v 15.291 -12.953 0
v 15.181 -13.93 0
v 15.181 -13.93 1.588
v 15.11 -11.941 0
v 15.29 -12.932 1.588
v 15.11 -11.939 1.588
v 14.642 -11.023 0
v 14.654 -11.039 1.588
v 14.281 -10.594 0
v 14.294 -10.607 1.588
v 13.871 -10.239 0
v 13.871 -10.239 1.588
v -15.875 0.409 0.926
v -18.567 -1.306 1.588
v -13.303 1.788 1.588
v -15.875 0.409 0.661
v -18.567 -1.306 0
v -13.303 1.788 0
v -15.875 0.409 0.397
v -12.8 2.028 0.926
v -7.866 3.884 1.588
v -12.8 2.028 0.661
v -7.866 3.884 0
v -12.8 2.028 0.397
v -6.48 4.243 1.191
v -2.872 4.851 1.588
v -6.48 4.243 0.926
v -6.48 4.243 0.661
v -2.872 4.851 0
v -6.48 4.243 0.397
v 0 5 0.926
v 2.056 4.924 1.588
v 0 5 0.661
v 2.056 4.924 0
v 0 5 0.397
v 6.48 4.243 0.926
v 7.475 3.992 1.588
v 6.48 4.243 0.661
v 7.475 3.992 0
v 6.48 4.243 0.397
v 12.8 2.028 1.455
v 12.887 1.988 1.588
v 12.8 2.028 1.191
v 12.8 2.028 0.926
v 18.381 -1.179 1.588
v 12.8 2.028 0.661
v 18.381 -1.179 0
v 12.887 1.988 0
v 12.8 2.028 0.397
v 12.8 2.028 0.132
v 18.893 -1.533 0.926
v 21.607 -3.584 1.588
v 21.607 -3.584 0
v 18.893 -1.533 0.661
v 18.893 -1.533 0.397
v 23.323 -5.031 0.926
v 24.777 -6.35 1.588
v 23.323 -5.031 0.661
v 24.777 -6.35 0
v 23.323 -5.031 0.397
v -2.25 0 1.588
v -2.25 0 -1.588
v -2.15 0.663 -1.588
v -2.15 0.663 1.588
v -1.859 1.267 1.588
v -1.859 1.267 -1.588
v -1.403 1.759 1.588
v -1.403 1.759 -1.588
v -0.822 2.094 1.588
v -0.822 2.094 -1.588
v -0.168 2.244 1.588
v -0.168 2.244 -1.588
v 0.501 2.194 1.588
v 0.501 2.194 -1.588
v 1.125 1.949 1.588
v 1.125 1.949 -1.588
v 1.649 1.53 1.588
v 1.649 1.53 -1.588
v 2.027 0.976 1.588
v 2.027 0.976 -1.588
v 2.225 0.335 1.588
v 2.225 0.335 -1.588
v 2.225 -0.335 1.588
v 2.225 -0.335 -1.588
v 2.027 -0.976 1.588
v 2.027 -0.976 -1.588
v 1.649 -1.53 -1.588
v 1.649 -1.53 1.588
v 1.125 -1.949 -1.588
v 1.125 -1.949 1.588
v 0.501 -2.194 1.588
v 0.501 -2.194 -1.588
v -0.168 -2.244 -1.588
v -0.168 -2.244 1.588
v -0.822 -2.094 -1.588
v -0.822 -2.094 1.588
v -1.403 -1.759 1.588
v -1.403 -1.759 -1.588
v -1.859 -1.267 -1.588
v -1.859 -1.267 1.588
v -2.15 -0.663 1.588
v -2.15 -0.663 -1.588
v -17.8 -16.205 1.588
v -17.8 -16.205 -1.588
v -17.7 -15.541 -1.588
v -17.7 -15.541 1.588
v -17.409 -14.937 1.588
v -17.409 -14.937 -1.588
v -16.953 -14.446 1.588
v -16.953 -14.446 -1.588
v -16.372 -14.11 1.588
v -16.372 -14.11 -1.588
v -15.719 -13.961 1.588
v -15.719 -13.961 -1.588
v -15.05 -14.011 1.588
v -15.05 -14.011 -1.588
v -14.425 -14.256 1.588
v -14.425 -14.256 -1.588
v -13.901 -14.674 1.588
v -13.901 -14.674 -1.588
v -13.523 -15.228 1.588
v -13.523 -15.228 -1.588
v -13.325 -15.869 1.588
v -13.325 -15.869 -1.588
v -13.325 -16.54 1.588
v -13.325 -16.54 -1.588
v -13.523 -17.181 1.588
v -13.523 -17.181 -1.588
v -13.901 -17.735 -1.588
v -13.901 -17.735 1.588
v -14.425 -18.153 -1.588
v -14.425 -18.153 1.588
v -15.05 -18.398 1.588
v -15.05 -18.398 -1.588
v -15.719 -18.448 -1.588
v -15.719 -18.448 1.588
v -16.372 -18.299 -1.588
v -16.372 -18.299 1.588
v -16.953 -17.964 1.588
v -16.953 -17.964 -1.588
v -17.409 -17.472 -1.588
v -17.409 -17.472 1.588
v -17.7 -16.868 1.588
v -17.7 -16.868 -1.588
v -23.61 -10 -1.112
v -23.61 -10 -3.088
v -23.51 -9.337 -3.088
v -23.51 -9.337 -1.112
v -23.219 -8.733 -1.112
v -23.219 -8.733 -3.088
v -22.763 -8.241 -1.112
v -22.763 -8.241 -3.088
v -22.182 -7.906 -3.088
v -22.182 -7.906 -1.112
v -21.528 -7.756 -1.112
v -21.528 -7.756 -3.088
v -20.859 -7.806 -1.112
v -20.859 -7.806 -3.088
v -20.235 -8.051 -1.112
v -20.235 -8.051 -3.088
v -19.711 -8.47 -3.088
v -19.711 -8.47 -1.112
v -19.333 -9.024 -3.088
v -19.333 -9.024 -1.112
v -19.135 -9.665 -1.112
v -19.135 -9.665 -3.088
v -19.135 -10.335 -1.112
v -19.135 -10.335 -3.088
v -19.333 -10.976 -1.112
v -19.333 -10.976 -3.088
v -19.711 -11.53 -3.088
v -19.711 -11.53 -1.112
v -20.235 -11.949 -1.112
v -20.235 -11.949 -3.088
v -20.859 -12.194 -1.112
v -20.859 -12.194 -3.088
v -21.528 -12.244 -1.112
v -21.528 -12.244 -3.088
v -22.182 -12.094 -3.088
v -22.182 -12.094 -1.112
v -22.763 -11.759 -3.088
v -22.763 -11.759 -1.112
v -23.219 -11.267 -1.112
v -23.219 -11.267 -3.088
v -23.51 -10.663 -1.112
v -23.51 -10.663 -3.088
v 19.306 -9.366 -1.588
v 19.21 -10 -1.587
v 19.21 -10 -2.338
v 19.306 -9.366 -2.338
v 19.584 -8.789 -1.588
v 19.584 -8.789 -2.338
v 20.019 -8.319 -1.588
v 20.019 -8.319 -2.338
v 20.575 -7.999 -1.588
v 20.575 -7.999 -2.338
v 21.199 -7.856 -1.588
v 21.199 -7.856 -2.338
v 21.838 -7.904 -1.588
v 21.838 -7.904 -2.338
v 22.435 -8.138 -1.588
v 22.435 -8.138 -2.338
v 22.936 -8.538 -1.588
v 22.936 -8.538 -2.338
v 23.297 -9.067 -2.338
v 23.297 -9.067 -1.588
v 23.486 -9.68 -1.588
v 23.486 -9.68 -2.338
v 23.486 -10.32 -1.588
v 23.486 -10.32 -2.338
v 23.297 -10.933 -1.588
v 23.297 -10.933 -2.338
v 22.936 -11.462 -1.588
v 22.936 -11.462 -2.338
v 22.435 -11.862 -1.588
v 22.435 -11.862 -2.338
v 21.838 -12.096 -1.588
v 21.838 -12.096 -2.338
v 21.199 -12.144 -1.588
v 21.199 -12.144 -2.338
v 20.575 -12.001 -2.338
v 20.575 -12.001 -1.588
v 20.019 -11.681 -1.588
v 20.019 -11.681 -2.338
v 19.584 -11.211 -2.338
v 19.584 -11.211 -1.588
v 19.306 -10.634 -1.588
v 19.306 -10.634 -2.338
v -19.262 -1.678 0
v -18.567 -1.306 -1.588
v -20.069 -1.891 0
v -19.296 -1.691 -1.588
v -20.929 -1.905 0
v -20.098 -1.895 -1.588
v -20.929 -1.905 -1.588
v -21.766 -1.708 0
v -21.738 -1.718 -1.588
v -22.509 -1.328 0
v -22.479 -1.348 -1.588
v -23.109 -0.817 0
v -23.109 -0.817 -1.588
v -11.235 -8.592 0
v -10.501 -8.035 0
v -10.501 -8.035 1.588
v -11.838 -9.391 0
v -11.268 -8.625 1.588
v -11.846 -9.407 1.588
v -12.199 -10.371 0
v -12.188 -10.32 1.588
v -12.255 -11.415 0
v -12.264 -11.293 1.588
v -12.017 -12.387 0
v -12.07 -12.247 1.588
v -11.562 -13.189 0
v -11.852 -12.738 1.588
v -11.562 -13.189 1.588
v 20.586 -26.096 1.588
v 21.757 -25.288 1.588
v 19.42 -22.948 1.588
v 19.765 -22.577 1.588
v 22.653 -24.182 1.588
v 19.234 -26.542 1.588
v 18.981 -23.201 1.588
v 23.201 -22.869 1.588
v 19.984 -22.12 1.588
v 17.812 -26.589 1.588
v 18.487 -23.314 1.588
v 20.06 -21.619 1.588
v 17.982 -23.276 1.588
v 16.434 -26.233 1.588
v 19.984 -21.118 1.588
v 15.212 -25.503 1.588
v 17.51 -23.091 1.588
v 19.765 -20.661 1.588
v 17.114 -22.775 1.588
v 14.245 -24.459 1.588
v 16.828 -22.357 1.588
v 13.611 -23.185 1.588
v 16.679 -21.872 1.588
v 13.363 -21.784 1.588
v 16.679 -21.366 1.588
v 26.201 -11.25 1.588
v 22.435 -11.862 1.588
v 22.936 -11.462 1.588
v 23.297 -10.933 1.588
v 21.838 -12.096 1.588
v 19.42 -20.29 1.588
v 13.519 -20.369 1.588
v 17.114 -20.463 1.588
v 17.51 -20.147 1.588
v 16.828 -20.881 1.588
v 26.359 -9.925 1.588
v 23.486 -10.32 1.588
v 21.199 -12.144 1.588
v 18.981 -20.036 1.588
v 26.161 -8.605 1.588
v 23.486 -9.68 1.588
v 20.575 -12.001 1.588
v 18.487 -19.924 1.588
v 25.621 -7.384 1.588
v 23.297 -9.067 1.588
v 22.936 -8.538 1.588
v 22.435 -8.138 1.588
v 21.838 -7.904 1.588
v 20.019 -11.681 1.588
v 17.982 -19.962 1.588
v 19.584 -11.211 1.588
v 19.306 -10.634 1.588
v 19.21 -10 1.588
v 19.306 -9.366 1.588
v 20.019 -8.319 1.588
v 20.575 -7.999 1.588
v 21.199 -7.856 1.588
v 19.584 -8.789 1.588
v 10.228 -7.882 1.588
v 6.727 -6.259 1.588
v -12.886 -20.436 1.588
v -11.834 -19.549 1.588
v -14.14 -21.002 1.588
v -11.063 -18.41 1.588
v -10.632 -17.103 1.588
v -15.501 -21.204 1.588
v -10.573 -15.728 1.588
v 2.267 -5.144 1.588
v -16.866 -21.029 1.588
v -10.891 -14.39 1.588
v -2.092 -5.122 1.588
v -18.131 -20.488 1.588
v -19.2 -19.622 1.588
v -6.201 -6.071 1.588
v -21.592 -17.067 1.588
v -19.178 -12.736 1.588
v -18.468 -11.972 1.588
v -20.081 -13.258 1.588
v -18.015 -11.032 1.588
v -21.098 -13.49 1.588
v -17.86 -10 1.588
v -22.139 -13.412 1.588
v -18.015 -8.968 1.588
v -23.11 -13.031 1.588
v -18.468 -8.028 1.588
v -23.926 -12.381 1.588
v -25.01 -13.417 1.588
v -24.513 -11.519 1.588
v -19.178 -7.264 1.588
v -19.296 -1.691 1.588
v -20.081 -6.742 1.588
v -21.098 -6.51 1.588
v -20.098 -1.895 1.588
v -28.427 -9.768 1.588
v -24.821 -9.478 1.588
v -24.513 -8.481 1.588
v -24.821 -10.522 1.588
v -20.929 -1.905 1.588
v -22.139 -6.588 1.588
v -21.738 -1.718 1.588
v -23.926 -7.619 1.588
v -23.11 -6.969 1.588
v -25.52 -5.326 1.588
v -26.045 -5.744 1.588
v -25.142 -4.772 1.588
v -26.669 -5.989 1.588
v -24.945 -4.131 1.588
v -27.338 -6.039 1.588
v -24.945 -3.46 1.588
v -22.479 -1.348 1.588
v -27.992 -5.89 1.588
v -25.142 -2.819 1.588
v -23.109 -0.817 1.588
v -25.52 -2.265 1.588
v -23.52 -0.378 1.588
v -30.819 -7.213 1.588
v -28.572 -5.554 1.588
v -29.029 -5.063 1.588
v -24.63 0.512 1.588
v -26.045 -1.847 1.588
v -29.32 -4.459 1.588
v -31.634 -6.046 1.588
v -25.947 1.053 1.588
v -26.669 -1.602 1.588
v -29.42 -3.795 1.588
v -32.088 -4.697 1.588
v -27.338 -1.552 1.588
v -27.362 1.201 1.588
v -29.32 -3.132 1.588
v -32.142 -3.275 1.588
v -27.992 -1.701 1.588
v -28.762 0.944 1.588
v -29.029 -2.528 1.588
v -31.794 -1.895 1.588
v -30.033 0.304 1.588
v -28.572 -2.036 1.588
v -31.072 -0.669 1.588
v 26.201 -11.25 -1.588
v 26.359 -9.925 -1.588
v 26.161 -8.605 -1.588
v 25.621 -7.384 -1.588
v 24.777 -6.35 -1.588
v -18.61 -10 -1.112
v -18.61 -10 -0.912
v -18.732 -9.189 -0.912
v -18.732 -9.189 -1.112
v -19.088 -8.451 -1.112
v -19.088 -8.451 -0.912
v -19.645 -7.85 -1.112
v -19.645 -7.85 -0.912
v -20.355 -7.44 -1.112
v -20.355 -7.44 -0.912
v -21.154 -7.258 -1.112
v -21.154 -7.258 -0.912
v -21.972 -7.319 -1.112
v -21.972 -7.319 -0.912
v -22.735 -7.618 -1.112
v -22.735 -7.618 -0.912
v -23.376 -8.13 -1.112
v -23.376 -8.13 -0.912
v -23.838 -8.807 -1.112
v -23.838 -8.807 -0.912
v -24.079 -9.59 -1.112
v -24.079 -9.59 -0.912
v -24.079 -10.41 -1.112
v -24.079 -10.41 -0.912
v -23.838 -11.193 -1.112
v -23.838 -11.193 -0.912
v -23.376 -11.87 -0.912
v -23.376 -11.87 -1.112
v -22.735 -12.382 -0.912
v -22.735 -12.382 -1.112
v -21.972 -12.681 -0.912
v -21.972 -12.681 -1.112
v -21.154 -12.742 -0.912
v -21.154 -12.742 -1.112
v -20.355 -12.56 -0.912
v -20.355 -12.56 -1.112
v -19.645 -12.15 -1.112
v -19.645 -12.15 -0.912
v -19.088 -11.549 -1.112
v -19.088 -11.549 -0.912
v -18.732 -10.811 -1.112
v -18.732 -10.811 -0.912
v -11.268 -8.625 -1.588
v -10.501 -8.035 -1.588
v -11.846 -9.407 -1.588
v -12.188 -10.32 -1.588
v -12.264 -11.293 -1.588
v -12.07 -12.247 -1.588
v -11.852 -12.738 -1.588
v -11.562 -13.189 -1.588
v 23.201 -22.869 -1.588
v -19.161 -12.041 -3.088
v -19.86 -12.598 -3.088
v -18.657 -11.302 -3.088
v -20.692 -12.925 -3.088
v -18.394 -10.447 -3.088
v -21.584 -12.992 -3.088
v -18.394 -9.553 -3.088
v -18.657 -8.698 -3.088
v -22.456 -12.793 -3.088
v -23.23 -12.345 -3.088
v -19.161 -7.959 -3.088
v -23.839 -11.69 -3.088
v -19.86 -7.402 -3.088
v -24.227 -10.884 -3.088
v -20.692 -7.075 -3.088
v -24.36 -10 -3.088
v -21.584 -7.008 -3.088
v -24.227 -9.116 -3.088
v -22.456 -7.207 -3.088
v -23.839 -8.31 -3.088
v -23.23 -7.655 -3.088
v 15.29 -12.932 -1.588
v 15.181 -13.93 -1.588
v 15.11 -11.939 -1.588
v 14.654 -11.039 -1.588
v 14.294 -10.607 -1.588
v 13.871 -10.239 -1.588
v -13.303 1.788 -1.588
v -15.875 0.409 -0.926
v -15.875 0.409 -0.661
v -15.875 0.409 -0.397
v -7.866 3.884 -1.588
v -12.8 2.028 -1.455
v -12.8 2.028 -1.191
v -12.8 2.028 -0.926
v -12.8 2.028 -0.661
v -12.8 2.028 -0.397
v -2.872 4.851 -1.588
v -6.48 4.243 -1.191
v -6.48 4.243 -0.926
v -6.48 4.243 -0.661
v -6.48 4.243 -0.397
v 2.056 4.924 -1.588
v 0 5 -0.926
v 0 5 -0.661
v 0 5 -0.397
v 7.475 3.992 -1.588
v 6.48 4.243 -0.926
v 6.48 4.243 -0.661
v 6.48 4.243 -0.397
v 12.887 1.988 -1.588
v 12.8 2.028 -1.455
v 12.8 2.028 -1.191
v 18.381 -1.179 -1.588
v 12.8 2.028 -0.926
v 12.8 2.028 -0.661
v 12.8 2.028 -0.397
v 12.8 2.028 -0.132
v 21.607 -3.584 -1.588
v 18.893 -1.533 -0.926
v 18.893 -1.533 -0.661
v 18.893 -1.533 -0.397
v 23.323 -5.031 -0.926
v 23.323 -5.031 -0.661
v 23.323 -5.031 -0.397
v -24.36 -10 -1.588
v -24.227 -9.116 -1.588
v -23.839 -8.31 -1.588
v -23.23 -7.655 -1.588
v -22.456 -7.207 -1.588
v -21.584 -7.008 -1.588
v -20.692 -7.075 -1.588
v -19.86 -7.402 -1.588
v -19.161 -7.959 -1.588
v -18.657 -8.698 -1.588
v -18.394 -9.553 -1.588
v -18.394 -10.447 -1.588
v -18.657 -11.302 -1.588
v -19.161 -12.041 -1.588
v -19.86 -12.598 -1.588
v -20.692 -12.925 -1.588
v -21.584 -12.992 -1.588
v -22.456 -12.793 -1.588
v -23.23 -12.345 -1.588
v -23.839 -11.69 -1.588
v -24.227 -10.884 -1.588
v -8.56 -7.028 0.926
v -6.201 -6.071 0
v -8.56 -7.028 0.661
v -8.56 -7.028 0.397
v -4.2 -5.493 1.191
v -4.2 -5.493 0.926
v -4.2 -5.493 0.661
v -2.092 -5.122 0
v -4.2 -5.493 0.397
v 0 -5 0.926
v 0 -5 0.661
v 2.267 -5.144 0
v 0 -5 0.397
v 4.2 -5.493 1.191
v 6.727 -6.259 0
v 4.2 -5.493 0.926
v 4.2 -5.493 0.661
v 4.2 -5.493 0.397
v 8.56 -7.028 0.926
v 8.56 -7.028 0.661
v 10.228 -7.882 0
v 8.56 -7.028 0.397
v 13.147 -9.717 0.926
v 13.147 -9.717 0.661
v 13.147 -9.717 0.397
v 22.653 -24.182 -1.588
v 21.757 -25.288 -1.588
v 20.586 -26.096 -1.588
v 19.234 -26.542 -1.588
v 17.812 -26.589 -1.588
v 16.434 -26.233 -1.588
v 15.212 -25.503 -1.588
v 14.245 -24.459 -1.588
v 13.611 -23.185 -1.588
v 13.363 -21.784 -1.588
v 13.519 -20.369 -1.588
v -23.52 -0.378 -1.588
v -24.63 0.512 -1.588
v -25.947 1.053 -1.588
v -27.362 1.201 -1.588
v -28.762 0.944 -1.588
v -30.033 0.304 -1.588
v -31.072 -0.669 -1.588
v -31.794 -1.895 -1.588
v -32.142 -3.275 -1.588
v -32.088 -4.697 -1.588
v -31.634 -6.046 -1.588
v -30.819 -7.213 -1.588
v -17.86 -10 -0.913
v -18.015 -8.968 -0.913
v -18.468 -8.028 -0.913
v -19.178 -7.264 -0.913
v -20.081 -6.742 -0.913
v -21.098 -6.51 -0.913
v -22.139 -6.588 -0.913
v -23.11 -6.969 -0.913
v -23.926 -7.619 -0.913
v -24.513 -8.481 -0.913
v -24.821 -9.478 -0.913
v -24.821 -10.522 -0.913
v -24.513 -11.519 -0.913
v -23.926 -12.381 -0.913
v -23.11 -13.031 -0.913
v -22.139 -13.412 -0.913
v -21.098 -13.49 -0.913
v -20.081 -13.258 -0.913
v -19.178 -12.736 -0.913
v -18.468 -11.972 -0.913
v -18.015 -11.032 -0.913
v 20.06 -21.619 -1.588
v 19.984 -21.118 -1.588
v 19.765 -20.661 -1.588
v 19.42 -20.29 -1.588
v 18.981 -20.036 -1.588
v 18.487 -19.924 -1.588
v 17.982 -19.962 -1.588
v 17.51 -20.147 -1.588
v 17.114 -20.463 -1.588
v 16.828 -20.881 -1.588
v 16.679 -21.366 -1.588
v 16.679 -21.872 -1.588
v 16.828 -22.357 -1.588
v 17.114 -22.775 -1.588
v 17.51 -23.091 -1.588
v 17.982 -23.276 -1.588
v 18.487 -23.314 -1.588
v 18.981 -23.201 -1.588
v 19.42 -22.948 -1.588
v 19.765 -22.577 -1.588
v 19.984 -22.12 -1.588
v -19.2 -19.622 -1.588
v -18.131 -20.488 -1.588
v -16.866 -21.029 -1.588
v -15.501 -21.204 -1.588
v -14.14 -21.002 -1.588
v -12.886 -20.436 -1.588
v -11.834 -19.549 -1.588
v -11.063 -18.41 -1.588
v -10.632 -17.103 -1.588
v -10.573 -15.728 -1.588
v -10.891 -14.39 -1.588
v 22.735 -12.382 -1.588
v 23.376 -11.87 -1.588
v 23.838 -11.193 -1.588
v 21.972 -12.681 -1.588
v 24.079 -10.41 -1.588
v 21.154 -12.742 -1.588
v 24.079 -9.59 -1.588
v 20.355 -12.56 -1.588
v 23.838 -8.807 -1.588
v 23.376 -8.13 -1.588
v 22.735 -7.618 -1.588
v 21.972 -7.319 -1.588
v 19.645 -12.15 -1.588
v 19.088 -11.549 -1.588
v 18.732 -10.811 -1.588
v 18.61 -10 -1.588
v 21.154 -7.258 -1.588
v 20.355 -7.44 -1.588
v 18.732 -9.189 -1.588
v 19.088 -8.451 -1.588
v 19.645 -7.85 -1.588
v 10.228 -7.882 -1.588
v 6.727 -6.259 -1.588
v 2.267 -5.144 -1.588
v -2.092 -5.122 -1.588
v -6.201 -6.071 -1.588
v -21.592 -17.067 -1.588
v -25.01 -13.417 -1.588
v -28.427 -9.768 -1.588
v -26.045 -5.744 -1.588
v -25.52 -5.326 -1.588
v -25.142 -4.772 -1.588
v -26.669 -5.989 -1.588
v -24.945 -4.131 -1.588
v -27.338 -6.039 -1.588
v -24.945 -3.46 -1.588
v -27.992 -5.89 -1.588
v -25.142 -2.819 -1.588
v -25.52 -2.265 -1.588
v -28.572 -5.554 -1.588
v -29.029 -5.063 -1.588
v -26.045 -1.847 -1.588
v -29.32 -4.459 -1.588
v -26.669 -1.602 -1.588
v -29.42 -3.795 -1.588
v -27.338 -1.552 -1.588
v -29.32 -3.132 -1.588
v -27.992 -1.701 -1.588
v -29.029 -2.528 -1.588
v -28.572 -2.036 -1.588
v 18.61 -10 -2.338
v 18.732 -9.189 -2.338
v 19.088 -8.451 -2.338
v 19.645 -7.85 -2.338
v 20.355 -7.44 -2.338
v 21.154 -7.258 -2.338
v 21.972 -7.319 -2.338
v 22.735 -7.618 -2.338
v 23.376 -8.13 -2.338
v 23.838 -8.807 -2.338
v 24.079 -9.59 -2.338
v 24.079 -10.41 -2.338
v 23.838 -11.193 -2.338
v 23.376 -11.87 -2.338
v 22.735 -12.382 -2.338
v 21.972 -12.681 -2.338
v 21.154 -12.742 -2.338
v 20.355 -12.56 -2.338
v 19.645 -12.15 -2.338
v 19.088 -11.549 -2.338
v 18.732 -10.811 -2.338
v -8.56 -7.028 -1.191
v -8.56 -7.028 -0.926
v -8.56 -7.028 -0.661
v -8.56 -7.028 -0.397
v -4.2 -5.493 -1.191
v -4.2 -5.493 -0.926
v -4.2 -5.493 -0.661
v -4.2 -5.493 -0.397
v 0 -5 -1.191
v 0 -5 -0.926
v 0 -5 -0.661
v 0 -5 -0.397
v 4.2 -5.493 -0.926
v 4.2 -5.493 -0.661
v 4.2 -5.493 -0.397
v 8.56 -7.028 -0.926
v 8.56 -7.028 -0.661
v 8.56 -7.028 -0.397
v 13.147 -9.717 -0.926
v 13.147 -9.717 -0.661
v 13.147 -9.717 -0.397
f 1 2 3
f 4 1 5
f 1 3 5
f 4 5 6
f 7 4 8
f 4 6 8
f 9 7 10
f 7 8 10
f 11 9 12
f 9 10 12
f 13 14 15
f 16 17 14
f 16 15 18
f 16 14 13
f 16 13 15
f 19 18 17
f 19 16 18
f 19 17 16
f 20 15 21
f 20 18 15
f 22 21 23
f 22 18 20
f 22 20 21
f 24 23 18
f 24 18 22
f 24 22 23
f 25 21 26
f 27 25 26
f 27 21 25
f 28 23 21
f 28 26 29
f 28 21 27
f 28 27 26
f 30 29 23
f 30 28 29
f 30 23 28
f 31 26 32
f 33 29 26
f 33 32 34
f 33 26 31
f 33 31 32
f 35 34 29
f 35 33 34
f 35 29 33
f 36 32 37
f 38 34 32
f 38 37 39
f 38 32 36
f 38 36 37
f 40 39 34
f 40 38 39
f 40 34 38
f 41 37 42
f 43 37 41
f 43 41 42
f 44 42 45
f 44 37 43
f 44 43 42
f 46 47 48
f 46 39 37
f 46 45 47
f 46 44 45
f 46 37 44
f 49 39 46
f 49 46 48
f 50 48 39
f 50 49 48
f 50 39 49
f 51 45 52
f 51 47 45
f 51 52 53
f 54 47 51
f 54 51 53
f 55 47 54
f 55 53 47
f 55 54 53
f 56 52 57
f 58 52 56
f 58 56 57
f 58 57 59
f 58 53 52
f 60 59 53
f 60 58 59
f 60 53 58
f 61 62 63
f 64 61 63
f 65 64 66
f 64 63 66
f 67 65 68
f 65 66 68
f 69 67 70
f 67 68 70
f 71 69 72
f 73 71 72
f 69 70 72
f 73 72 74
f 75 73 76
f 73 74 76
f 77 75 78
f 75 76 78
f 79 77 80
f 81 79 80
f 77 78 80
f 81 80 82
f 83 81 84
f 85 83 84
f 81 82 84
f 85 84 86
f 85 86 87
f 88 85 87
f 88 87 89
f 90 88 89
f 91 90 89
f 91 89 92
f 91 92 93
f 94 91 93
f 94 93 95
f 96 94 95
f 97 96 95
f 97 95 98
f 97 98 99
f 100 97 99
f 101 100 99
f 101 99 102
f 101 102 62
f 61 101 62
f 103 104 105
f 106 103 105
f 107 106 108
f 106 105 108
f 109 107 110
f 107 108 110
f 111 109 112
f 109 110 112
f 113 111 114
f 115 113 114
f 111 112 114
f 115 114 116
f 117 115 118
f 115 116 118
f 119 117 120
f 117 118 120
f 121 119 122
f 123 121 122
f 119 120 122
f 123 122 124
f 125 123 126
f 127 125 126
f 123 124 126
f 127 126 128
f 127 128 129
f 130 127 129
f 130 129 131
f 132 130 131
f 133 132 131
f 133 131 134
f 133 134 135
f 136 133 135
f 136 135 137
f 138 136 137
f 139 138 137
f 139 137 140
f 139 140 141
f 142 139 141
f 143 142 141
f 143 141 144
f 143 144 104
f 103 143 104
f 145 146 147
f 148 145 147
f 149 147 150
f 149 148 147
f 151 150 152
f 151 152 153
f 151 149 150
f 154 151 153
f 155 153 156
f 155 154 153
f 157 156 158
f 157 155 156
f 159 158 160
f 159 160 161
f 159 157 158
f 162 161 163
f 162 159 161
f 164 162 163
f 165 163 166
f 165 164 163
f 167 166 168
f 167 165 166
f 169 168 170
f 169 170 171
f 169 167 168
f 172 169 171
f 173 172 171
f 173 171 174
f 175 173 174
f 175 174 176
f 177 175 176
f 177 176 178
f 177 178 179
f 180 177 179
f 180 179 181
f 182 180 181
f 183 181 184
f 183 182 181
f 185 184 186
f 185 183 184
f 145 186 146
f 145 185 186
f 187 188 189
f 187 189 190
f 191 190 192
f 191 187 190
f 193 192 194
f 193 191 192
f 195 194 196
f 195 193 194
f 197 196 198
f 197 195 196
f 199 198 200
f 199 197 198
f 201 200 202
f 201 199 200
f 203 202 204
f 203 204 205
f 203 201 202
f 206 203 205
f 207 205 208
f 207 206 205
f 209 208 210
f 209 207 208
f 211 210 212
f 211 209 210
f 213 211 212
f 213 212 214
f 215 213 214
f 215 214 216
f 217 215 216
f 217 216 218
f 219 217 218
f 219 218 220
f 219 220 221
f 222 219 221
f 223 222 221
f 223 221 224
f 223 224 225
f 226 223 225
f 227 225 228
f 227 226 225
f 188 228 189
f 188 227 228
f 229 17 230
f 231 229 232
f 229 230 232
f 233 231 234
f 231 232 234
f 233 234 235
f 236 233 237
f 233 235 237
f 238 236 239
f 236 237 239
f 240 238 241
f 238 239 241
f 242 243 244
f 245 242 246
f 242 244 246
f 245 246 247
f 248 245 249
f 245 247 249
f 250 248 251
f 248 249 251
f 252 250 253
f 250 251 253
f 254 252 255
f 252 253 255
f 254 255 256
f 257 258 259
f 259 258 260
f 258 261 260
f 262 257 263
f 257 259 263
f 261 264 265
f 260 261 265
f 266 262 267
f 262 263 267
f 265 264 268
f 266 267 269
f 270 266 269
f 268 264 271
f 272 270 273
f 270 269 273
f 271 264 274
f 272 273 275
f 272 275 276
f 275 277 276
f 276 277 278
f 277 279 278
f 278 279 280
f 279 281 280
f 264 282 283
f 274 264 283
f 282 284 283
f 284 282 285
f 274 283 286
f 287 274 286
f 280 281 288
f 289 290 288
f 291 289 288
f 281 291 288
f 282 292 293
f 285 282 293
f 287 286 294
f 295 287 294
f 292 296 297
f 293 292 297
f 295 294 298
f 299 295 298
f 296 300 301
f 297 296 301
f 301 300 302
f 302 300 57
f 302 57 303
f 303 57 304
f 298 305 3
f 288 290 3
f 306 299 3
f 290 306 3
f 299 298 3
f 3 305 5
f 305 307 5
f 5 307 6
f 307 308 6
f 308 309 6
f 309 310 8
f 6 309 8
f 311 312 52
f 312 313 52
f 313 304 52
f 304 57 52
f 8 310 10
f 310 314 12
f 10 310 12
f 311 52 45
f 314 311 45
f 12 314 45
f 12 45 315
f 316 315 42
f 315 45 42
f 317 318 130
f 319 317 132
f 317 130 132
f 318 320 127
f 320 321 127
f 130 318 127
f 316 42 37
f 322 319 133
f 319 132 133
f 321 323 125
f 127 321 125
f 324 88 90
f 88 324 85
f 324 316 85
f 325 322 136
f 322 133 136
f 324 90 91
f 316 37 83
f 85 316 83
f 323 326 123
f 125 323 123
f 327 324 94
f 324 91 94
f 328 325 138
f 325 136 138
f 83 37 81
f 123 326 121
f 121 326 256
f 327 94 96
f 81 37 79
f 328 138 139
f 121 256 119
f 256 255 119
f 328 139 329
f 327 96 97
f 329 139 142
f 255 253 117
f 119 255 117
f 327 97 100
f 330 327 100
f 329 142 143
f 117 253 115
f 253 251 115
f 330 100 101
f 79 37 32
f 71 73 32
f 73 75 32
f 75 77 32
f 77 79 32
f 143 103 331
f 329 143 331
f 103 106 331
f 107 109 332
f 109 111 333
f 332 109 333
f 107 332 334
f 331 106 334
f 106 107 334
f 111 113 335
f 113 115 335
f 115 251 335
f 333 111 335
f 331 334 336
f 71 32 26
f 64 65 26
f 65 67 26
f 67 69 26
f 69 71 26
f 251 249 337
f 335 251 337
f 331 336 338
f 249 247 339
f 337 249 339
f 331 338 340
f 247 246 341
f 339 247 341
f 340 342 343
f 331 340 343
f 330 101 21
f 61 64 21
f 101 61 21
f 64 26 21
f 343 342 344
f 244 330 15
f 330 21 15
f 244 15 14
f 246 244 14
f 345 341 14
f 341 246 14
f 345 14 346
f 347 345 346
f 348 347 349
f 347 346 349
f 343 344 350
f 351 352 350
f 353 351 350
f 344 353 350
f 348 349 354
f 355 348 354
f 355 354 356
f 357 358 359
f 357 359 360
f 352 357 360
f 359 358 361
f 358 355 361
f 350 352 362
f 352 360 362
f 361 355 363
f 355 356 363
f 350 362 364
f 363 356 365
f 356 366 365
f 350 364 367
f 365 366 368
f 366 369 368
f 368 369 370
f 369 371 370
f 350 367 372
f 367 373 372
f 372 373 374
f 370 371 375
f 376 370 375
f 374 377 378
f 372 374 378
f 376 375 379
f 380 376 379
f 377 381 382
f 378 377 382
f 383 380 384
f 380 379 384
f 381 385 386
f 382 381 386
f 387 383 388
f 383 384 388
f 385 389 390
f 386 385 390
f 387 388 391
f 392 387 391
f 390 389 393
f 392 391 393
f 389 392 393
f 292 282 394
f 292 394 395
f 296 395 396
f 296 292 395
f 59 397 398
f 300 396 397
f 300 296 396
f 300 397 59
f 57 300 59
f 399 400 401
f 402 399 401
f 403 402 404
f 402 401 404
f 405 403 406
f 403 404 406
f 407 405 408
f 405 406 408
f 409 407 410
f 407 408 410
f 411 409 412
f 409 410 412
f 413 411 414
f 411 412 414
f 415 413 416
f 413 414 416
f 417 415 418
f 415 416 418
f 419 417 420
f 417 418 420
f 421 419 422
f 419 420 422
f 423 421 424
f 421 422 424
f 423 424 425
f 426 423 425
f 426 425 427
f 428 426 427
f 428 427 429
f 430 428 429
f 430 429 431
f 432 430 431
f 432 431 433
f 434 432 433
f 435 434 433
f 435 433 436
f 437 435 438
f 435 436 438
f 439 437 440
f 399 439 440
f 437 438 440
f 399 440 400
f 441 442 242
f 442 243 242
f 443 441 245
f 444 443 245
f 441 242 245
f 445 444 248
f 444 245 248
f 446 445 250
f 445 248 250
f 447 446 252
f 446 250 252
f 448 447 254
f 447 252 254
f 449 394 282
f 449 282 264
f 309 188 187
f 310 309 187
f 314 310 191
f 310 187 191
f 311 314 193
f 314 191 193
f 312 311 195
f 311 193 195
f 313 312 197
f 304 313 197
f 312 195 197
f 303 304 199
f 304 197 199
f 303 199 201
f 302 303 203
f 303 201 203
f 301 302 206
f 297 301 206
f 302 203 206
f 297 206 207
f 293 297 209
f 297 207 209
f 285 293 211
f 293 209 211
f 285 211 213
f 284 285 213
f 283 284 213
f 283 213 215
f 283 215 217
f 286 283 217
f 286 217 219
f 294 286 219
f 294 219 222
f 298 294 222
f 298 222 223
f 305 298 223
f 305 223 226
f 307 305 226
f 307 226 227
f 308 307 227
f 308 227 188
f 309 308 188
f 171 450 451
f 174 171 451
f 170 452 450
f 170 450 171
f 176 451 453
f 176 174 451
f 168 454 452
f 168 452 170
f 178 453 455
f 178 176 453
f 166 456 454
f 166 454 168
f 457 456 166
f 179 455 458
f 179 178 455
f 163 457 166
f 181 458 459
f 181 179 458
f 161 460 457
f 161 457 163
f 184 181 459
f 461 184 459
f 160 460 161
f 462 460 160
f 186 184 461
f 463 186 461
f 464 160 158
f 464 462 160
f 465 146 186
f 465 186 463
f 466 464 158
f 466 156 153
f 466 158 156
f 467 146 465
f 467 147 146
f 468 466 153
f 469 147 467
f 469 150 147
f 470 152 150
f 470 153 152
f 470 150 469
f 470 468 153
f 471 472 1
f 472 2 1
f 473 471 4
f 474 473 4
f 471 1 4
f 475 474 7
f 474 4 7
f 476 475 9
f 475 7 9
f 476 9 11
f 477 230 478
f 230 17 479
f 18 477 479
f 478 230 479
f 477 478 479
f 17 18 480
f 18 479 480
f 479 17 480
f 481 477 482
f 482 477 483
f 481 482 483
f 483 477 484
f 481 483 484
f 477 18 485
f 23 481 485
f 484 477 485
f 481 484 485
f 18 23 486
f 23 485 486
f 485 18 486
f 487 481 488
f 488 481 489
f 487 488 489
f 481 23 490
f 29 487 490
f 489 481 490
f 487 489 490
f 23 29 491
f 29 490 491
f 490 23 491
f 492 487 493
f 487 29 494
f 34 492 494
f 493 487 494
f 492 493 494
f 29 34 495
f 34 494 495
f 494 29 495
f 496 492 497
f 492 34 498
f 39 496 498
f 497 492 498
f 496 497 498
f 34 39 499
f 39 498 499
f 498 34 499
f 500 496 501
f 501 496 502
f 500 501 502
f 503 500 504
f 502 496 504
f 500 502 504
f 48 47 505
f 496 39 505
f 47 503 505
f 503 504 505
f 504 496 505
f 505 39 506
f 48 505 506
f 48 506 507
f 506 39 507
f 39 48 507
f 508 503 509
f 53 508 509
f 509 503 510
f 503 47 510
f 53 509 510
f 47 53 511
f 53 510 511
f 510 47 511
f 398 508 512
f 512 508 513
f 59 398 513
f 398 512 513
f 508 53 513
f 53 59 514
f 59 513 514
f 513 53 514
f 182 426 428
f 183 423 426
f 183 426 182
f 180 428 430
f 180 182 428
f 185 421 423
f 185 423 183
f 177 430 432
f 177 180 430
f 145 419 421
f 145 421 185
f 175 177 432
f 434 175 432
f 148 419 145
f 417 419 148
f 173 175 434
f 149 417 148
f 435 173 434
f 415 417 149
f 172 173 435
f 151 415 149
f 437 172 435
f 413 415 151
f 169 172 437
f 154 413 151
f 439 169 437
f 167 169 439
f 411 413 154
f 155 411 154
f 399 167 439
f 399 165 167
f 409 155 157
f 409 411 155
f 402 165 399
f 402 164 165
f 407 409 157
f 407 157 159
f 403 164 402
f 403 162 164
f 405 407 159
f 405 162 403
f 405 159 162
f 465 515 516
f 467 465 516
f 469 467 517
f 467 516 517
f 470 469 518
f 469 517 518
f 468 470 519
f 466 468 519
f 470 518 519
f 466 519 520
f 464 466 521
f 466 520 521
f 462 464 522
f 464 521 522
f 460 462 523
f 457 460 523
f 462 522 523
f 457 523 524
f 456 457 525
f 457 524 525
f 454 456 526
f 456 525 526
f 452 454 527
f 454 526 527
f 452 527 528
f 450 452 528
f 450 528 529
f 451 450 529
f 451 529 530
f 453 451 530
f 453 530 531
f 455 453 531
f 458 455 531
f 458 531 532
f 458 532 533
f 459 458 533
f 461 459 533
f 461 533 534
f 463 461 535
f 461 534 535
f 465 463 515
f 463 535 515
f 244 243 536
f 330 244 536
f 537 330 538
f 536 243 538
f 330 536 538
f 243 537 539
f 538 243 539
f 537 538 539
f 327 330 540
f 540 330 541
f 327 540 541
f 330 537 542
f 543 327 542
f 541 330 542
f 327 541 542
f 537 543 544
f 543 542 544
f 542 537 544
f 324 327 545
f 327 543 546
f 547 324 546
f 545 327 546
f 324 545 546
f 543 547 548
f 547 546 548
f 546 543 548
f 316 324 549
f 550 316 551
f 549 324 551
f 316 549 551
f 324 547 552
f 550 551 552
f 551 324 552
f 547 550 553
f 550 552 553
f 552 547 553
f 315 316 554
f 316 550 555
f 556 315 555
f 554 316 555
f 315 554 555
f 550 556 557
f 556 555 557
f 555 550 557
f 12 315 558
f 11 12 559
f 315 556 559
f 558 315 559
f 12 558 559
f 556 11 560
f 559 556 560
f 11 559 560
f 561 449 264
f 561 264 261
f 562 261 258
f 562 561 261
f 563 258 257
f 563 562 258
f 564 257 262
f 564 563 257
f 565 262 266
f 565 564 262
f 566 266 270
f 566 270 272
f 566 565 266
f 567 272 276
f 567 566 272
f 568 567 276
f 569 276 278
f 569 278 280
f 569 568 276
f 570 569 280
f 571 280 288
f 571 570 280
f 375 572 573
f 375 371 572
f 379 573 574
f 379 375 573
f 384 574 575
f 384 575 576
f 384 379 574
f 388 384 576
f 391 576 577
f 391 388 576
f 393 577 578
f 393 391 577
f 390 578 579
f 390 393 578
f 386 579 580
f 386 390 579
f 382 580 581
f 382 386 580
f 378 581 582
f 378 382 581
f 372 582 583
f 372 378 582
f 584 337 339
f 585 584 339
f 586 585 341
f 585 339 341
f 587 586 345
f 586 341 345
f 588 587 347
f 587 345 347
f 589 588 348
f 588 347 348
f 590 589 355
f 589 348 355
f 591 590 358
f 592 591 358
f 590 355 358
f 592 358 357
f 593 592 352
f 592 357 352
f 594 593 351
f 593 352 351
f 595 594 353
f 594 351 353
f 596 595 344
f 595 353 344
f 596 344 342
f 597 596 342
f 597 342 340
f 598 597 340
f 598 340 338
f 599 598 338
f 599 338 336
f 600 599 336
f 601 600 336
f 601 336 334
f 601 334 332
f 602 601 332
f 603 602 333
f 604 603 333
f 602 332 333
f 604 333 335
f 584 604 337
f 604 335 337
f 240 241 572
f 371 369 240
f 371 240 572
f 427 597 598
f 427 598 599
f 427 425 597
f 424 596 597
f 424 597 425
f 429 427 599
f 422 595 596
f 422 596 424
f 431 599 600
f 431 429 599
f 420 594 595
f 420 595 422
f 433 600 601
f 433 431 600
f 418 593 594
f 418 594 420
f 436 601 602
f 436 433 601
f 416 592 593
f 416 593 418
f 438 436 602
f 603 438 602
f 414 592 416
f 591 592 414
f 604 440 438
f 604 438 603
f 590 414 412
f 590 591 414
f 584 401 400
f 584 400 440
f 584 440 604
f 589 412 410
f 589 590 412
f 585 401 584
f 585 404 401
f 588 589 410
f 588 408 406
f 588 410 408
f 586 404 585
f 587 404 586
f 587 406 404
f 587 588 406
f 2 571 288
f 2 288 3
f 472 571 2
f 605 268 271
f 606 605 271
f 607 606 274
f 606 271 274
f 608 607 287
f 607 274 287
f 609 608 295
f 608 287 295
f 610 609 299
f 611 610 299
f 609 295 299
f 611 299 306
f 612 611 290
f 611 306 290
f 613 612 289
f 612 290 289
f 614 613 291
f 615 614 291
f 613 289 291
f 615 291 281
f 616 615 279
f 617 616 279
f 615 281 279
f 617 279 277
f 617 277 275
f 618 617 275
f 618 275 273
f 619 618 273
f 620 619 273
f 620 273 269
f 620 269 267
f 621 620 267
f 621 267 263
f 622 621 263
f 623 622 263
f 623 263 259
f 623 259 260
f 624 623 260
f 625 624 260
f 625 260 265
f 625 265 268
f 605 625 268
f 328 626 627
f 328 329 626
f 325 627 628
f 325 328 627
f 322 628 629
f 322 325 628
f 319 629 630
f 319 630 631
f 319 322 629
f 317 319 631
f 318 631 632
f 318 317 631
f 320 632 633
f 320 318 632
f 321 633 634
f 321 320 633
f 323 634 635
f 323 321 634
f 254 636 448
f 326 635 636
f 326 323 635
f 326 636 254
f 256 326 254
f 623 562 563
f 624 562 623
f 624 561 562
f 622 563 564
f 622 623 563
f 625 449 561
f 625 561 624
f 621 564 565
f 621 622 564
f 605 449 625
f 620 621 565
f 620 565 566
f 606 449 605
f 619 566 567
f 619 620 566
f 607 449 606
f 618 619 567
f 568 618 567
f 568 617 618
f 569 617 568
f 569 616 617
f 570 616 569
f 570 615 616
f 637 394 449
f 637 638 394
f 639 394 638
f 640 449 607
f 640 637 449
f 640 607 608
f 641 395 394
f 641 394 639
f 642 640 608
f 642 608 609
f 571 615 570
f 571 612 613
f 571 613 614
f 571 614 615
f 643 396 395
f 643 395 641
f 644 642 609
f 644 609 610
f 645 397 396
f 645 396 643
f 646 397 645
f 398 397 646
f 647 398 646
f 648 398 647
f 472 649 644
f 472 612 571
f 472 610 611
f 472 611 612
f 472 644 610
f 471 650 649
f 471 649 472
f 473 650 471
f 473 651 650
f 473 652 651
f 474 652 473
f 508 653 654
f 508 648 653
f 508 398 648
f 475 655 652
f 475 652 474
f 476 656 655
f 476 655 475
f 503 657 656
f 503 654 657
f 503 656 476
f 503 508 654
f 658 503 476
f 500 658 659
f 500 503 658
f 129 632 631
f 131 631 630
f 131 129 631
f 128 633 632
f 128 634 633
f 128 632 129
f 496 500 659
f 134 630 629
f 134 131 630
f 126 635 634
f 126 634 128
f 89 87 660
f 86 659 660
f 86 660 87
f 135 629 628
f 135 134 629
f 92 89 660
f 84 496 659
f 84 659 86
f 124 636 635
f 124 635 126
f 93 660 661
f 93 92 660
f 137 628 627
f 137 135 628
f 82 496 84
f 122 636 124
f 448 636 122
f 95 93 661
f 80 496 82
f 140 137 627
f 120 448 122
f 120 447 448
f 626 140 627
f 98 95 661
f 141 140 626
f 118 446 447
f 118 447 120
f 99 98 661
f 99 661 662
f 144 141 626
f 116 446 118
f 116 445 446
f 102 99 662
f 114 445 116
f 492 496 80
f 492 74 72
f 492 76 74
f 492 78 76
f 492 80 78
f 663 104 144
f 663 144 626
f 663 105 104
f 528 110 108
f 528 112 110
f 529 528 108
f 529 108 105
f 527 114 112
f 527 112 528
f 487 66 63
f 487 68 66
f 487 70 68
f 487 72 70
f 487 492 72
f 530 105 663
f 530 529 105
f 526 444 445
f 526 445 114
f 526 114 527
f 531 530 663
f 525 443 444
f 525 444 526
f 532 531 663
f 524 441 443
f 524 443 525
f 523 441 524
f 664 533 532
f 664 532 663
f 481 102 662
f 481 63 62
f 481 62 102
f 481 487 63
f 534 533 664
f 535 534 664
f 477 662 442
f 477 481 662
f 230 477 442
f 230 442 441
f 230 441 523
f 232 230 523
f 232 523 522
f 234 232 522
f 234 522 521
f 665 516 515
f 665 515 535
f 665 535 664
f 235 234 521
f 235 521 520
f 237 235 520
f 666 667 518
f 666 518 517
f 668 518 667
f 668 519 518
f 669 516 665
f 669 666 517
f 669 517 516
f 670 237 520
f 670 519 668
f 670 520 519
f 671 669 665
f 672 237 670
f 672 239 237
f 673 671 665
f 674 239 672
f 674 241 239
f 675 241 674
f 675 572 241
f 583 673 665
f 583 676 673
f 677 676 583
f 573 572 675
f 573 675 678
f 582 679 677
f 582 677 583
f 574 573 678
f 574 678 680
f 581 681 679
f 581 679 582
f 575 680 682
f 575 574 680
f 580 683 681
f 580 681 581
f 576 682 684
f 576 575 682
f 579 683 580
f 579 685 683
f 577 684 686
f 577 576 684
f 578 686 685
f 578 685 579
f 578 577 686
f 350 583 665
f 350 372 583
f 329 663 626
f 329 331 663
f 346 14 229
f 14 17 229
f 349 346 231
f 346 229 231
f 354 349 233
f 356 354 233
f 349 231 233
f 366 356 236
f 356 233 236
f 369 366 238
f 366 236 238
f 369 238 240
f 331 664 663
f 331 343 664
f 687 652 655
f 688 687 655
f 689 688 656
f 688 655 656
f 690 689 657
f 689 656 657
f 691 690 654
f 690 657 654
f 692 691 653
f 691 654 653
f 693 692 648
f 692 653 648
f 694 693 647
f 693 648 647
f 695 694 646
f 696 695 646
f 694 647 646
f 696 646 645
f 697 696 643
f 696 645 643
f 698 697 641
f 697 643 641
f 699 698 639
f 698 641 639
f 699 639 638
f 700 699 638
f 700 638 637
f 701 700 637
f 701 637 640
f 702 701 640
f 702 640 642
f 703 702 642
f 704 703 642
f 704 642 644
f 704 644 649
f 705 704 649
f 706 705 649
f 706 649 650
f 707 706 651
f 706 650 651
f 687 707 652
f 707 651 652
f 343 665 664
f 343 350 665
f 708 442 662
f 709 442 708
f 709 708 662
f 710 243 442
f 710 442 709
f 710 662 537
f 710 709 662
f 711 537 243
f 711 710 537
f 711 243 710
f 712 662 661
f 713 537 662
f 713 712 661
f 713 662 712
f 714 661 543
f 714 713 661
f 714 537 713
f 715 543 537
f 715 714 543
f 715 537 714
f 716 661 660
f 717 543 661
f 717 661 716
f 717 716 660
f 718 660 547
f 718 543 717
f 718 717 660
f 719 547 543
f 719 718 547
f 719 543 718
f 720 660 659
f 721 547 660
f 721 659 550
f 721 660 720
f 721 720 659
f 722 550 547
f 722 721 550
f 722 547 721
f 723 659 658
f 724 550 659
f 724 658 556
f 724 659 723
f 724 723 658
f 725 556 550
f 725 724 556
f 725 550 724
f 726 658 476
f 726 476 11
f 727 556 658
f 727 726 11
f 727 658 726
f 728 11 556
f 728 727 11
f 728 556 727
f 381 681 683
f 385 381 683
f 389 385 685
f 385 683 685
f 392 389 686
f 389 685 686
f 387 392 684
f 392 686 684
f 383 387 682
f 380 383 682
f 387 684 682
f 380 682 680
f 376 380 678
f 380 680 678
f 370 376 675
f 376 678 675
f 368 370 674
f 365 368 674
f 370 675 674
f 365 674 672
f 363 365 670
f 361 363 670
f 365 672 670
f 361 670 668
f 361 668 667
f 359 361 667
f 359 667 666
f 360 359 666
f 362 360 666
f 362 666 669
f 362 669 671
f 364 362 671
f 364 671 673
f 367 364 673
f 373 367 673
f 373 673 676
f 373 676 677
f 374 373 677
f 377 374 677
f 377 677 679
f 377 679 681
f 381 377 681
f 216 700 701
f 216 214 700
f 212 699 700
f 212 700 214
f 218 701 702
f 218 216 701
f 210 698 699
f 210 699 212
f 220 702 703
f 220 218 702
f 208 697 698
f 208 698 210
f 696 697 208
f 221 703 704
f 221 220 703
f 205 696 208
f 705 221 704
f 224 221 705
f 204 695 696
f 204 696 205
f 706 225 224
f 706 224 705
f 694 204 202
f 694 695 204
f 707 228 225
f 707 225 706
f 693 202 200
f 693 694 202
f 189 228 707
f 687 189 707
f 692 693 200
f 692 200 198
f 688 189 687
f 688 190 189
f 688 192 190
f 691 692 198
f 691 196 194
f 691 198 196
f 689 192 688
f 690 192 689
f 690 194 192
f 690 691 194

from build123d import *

# Parameters (mm, degrees)
BOSS_EXTRUDE1_DEPTH  = 1.5875
M4_CLEARANCE_HOLE1_D = 4.5
BOSS_EXTRUDE2_DEPTH  = 3.175
M3_CLEARANCE_HOLE1_D = 3.4
FILLET1_R            = 3.5
SKETCH8_R            = 2.15
CUT_EXTRUDE1_DEPTH   = 4.1750001
SKETCH9_R            = 2.75
SKETCH9_R_2          = 2.15
BOSS_EXTRUDE3_DEPTH  = 0.75
SKETCH11_R           = 3.5
CUT_EXTRUDE2_DEPTH   = 2.5
SKETCH12_R           = 2.75
CUT_EXTRUDE3_DEPTH   = 0.2
SKETCH13_R           = 3
SKETCH13_R_2         = 2.25
BOSS_EXTRUDE5_DEPTH  = 1.5


with BuildPart() as part:
    # Sketch2 → Boss-Extrude1 (new body, symmetric)
    with BuildSketch(Plane.XY):
        with BuildLine():
            add(Edge.make_bspline(
                [(-24.777431429, -6.350183234), (-24.299810251, -5.902972393), (-23.32289496, -5.01651393), (-22.058866471, -3.944003435), (-21.276036232, -3.316259916), (-20.98344634, -3.086723573)],
                knots=[0, 0, 0, 0, 0.03125, 0.0625, 0.081068463, 0.081068463, 0.081068463, 0.081068463], degree=3))
            Line((-24.777431429, -6.350183234), (-21.36, -10))
            add(Edge.make_bspline(
                [(-21.36, -10), (-20.09052587, -8.81135381), (-18.821051739, -7.728673603), (-17.551577609, -6.751959378)],
                knots=[0, 0, 0, 0, 0.089148464, 0.089148464, 0.089148464, 0.089148464], degree=3))
            Line((-17.551577609, -6.751959378), (-20.98344634, -3.086723573))
        make_face()
        with BuildLine():
            Line((-21.36, -10), (-24.777431429, -6.350183234))
            ThreePointArc((-24.777431429, -6.350183234), (-26.357299125, -9.8356788), (-25.009816701, -13.417431499))
            ThreePointArc((-25.009816701, -13.417431499), (-21.5243212, -14.997299125), (-17.942568571, -13.649816766))
            Line((-17.942568571, -13.649816766), (-21.36, -10))
        make_face()
        with BuildLine():
            ThreePointArc((-25.009816701, -13.417431499), (-26.357299125, -9.8356788), (-24.777431429, -6.350183234))
            add(Edge.make_bspline(
                [(-24.777431429, -6.350183234), (-24.299810251, -5.902972393), (-23.32289496, -5.01651393), (-22.058866471, -3.944003435), (-21.276036232, -3.316259916), (-20.98344634, -3.086723573)],
                knots=[0, 0, 0, 0, 0.03125, 0.0625, 0.081068463, 0.081068463, 0.081068463, 0.081068463], degree=3))
            Line((-20.98344634, -3.086723573), (-21.127614663, -2.932751805))
            Line((-21.127614663, -2.932751805), (-23.519816663, -0.377880068))
            ThreePointArc((-23.519816663, -0.377880068), (-30.587064859, -0.145494731), (-30.819450196, -7.212742926))
            Line((-30.819450196, -7.212742926), (-28.427248195, -9.767614663))
            Line((-28.427248195, -9.767614663), (-25.009816701, -13.417431499))
        make_face()
        with BuildLine():
            add(Edge.make_bspline(
                [(-21.36, -10), (-20.09052587, -8.81135381), (-18.821051739, -7.728673603), (-17.551577609, -6.751959378)],
                knots=[0, 0, 0, 0, 0.089148464, 0.089148464, 0.089148464, 0.089148464], degree=3))
            Line((-21.36, -10), (-17.942568571, -13.649816766))
            add(Edge.make_bspline(
                [(-17.942568571, -13.649816766), (-17.543072686, -13.275756949), (-16.7212792, -12.530114496), (-15.44829951, -11.450473224), (-14.582019434, -10.770813046), (-14.116024052, -10.421130577)],
                knots=[0, 0, 0, 0, 0.03125, 0.0625, 0.099339971, 0.099339971, 0.099339971, 0.099339971], degree=3))
            Line((-14.116024052, -10.421130577), (-14.292751805, -10.232385337))
            Line((-14.292751805, -10.232385337), (-17.551577609, -6.751959378))
        make_face()
        with BuildLine():
            ThreePointArc((-17.942568571, -13.649816766), (-21.5243212, -14.997299125), (-25.009816701, -13.417431499))
            Line((-25.009816701, -13.417431499), (-21.592385337, -17.067248195))
            Line((-21.592385337, -17.067248195), (-19.200183337, -19.622119932))
            ThreePointArc((-19.200183337, -19.622119932), (-12.132935141, -19.854505269), (-11.900549804, -12.787257074))
            Line((-11.900549804, -12.787257074), (-14.116024052, -10.421130577))
            add(Edge.make_bspline(
                [(-17.942568571, -13.649816766), (-17.543072686, -13.275756949), (-16.7212792, -12.530114496), (-15.44829951, -11.450473224), (-14.582019434, -10.770813046), (-14.116024052, -10.421130577)],
                knots=[0, 0, 0, 0, 0.03125, 0.0625, 0.099339971, 0.099339971, 0.099339971, 0.099339971], degree=3))
        make_face()
        with BuildLine():
            add(Edge.make_bspline(
                [(-20.98344634, -3.086723573), (-20.291201445, -2.543658465), (-18.603117827, -1.28817338), (-15.885096675, 0.462779531), (-11.785009924, 2.624744664), (-6.509375137, 4.48808894), (0, 5.25595553), (6.509375137, 4.48808894), (11.785009924, 2.624744664), (15.885096675, 0.462779531), (18.901874802, -1.480633029), (21.37388106, -3.362802893), (23.32289496, -5.01651393), (24.299810251, -5.902972393), (24.777431429, -6.350183234)],
                knots=[0.081068463, 0.081068463, 0.081068463, 0.081068463, 0.125, 0.1875, 0.25, 0.375, 0.5, 0.625, 0.75, 0.8125, 0.875, 0.9375, 0.96875, 1, 1, 1, 1], degree=3))
            Line((-20.98344634, -3.086723573), (-17.551577609, -6.751959378))
            Line((-17.551577609, -6.751959378), (-14.292751805, -10.232385337))
            Line((-14.292751805, -10.232385337), (-14.116024052, -10.421130577))
            add(Edge.make_bspline(
                [(-14.116024052, -10.421130577), (-13.791445759, -10.177567349), (-12.680801028, -9.370838959), (-10.815202086, -8.171392792), (-7.794818062, -6.582915934), (-4.170679183, -5.321481205), (0, -4.839259398), (4.170679183, -5.321481205), (7.794818062, -6.582915934), (10.815202086, -8.171392792), (13.136984474, -9.664132159), (15.119482265, -11.171596294), (16.7212792, -12.530114496), (17.543072686, -13.275756949), (17.942568571, -13.649816766)],
                knots=[0.099339971, 0.099339971, 0.099339971, 0.099339971, 0.125, 0.1875, 0.25, 0.375, 0.5, 0.625, 0.75, 0.8125, 0.875, 0.9375, 0.96875, 1, 1, 1, 1], degree=3))
            ThreePointArc((17.942568571, -13.649816766), (25.009816766, -13.417431429), (24.777431429, -6.350183234))
        make_face()
    extrude(amount=BOSS_EXTRUDE1_DEPTH, both=True)

    # M4 Clearance Hole1 (through all)
    with Locations(Plane.XY.offset(1.5875)):
        with Locations((-21.359999999, -9.999999999), (0, 0), (-15.550366571, -16.204688503), (-27.169633429, -3.795311497)):
            Hole(M4_CLEARANCE_HOLE1_D / 2)

    # Sketch5 → Boss-Extrude2 (add)
    with BuildSketch(Plane(origin=(0, 0, -1.5875), x_dir=(-1, 0, 0), z_dir=(0, 0, -1))):
        with BuildLine():
            ThreePointArc((-23.201229183, -22.868950039), (-17.11, -26.460179221), (-13.518770817, -20.368950039))
            Line((-13.518770817, -20.368950039), (-16.518770817, -8.75))
            ThreePointArc((-16.518770817, -8.75), (-22.61, -5.158770817), (-26.201229183, -11.25))
            Line((-26.201229183, -11.25), (-23.201229183, -22.868950039))
        make_face()
    extrude(amount=-BOSS_EXTRUDE2_DEPTH)

    # M3 Clearance Hole1 (through all)
    with Locations(Plane(origin=(0, 0, -1.5875), x_dir=(-1, 0, 0), z_dir=(0, 0, -1))):
        with Locations((-18.36, -21.618950039)):
            Hole(M3_CLEARANCE_HOLE1_D / 2)

    # Fillet1
    fillet1_edges = [part.edges().sort_by_distance(p)[0] for p in [
        (15.75315909, -11.715201468, -0.79375),
        (-20.98344634, -3.086723573, -0.79375),
        (-14.116024052, -10.421130577, 0.79375),
    ]]
    fillet(fillet1_edges, radius=FILLET1_R)

    # Sketch8 → Cut-Extrude1 (cut, through all)
    with BuildSketch(Plane(origin=(0, 0, -1.5875), x_dir=(-1, 0, 0), z_dir=(0, 0, -1))):
        with Locations((-21.36, -10)):
            Circle(SKETCH8_R)
    extrude(amount=-CUT_EXTRUDE1_DEPTH, mode=Mode.SUBTRACT)

    # Sketch9 → Boss-Extrude3 (add)
    with BuildSketch(Plane(origin=(0, 0, -1.5875), x_dir=(-1, 0, 0), z_dir=(0, 0, -1))):
        with Locations((-21.36, -10)):
            Circle(SKETCH9_R)
        with Locations((-21.36, -10)):
            Circle(SKETCH9_R_2, mode=Mode.SUBTRACT)
    extrude(amount=BOSS_EXTRUDE3_DEPTH)

    # Sketch11 → Cut-Extrude2 (cut)
    with BuildSketch(Plane.XY.offset(1.5875)):
        with Locations((-21.359999999, -9.999999999)):
            Circle(SKETCH11_R)
    extrude(amount=-CUT_EXTRUDE2_DEPTH, mode=Mode.SUBTRACT)

    # Sketch12 → Cut-Extrude3 (cut)
    with BuildSketch(Plane.XY.offset(-0.9125)):
        with Locations((-21.359999999, -9.999999999)):
            Circle(SKETCH12_R)
    extrude(amount=-CUT_EXTRUDE3_DEPTH, mode=Mode.SUBTRACT)

    # Sketch13 → Boss-Extrude5 (add)
    with BuildSketch(Plane(origin=(0, 0, -1.5875), x_dir=(-1, 0, 0), z_dir=(0, 0, -1))):
        with Locations((21.359999999, -9.999999999)):
            Circle(SKETCH13_R)
        with Locations((21.359999999, -9.999999999)):
            Circle(SKETCH13_R_2, mode=Mode.SUBTRACT)
    extrude(amount=BOSS_EXTRUDE5_DEPTH)


solid = part.part
